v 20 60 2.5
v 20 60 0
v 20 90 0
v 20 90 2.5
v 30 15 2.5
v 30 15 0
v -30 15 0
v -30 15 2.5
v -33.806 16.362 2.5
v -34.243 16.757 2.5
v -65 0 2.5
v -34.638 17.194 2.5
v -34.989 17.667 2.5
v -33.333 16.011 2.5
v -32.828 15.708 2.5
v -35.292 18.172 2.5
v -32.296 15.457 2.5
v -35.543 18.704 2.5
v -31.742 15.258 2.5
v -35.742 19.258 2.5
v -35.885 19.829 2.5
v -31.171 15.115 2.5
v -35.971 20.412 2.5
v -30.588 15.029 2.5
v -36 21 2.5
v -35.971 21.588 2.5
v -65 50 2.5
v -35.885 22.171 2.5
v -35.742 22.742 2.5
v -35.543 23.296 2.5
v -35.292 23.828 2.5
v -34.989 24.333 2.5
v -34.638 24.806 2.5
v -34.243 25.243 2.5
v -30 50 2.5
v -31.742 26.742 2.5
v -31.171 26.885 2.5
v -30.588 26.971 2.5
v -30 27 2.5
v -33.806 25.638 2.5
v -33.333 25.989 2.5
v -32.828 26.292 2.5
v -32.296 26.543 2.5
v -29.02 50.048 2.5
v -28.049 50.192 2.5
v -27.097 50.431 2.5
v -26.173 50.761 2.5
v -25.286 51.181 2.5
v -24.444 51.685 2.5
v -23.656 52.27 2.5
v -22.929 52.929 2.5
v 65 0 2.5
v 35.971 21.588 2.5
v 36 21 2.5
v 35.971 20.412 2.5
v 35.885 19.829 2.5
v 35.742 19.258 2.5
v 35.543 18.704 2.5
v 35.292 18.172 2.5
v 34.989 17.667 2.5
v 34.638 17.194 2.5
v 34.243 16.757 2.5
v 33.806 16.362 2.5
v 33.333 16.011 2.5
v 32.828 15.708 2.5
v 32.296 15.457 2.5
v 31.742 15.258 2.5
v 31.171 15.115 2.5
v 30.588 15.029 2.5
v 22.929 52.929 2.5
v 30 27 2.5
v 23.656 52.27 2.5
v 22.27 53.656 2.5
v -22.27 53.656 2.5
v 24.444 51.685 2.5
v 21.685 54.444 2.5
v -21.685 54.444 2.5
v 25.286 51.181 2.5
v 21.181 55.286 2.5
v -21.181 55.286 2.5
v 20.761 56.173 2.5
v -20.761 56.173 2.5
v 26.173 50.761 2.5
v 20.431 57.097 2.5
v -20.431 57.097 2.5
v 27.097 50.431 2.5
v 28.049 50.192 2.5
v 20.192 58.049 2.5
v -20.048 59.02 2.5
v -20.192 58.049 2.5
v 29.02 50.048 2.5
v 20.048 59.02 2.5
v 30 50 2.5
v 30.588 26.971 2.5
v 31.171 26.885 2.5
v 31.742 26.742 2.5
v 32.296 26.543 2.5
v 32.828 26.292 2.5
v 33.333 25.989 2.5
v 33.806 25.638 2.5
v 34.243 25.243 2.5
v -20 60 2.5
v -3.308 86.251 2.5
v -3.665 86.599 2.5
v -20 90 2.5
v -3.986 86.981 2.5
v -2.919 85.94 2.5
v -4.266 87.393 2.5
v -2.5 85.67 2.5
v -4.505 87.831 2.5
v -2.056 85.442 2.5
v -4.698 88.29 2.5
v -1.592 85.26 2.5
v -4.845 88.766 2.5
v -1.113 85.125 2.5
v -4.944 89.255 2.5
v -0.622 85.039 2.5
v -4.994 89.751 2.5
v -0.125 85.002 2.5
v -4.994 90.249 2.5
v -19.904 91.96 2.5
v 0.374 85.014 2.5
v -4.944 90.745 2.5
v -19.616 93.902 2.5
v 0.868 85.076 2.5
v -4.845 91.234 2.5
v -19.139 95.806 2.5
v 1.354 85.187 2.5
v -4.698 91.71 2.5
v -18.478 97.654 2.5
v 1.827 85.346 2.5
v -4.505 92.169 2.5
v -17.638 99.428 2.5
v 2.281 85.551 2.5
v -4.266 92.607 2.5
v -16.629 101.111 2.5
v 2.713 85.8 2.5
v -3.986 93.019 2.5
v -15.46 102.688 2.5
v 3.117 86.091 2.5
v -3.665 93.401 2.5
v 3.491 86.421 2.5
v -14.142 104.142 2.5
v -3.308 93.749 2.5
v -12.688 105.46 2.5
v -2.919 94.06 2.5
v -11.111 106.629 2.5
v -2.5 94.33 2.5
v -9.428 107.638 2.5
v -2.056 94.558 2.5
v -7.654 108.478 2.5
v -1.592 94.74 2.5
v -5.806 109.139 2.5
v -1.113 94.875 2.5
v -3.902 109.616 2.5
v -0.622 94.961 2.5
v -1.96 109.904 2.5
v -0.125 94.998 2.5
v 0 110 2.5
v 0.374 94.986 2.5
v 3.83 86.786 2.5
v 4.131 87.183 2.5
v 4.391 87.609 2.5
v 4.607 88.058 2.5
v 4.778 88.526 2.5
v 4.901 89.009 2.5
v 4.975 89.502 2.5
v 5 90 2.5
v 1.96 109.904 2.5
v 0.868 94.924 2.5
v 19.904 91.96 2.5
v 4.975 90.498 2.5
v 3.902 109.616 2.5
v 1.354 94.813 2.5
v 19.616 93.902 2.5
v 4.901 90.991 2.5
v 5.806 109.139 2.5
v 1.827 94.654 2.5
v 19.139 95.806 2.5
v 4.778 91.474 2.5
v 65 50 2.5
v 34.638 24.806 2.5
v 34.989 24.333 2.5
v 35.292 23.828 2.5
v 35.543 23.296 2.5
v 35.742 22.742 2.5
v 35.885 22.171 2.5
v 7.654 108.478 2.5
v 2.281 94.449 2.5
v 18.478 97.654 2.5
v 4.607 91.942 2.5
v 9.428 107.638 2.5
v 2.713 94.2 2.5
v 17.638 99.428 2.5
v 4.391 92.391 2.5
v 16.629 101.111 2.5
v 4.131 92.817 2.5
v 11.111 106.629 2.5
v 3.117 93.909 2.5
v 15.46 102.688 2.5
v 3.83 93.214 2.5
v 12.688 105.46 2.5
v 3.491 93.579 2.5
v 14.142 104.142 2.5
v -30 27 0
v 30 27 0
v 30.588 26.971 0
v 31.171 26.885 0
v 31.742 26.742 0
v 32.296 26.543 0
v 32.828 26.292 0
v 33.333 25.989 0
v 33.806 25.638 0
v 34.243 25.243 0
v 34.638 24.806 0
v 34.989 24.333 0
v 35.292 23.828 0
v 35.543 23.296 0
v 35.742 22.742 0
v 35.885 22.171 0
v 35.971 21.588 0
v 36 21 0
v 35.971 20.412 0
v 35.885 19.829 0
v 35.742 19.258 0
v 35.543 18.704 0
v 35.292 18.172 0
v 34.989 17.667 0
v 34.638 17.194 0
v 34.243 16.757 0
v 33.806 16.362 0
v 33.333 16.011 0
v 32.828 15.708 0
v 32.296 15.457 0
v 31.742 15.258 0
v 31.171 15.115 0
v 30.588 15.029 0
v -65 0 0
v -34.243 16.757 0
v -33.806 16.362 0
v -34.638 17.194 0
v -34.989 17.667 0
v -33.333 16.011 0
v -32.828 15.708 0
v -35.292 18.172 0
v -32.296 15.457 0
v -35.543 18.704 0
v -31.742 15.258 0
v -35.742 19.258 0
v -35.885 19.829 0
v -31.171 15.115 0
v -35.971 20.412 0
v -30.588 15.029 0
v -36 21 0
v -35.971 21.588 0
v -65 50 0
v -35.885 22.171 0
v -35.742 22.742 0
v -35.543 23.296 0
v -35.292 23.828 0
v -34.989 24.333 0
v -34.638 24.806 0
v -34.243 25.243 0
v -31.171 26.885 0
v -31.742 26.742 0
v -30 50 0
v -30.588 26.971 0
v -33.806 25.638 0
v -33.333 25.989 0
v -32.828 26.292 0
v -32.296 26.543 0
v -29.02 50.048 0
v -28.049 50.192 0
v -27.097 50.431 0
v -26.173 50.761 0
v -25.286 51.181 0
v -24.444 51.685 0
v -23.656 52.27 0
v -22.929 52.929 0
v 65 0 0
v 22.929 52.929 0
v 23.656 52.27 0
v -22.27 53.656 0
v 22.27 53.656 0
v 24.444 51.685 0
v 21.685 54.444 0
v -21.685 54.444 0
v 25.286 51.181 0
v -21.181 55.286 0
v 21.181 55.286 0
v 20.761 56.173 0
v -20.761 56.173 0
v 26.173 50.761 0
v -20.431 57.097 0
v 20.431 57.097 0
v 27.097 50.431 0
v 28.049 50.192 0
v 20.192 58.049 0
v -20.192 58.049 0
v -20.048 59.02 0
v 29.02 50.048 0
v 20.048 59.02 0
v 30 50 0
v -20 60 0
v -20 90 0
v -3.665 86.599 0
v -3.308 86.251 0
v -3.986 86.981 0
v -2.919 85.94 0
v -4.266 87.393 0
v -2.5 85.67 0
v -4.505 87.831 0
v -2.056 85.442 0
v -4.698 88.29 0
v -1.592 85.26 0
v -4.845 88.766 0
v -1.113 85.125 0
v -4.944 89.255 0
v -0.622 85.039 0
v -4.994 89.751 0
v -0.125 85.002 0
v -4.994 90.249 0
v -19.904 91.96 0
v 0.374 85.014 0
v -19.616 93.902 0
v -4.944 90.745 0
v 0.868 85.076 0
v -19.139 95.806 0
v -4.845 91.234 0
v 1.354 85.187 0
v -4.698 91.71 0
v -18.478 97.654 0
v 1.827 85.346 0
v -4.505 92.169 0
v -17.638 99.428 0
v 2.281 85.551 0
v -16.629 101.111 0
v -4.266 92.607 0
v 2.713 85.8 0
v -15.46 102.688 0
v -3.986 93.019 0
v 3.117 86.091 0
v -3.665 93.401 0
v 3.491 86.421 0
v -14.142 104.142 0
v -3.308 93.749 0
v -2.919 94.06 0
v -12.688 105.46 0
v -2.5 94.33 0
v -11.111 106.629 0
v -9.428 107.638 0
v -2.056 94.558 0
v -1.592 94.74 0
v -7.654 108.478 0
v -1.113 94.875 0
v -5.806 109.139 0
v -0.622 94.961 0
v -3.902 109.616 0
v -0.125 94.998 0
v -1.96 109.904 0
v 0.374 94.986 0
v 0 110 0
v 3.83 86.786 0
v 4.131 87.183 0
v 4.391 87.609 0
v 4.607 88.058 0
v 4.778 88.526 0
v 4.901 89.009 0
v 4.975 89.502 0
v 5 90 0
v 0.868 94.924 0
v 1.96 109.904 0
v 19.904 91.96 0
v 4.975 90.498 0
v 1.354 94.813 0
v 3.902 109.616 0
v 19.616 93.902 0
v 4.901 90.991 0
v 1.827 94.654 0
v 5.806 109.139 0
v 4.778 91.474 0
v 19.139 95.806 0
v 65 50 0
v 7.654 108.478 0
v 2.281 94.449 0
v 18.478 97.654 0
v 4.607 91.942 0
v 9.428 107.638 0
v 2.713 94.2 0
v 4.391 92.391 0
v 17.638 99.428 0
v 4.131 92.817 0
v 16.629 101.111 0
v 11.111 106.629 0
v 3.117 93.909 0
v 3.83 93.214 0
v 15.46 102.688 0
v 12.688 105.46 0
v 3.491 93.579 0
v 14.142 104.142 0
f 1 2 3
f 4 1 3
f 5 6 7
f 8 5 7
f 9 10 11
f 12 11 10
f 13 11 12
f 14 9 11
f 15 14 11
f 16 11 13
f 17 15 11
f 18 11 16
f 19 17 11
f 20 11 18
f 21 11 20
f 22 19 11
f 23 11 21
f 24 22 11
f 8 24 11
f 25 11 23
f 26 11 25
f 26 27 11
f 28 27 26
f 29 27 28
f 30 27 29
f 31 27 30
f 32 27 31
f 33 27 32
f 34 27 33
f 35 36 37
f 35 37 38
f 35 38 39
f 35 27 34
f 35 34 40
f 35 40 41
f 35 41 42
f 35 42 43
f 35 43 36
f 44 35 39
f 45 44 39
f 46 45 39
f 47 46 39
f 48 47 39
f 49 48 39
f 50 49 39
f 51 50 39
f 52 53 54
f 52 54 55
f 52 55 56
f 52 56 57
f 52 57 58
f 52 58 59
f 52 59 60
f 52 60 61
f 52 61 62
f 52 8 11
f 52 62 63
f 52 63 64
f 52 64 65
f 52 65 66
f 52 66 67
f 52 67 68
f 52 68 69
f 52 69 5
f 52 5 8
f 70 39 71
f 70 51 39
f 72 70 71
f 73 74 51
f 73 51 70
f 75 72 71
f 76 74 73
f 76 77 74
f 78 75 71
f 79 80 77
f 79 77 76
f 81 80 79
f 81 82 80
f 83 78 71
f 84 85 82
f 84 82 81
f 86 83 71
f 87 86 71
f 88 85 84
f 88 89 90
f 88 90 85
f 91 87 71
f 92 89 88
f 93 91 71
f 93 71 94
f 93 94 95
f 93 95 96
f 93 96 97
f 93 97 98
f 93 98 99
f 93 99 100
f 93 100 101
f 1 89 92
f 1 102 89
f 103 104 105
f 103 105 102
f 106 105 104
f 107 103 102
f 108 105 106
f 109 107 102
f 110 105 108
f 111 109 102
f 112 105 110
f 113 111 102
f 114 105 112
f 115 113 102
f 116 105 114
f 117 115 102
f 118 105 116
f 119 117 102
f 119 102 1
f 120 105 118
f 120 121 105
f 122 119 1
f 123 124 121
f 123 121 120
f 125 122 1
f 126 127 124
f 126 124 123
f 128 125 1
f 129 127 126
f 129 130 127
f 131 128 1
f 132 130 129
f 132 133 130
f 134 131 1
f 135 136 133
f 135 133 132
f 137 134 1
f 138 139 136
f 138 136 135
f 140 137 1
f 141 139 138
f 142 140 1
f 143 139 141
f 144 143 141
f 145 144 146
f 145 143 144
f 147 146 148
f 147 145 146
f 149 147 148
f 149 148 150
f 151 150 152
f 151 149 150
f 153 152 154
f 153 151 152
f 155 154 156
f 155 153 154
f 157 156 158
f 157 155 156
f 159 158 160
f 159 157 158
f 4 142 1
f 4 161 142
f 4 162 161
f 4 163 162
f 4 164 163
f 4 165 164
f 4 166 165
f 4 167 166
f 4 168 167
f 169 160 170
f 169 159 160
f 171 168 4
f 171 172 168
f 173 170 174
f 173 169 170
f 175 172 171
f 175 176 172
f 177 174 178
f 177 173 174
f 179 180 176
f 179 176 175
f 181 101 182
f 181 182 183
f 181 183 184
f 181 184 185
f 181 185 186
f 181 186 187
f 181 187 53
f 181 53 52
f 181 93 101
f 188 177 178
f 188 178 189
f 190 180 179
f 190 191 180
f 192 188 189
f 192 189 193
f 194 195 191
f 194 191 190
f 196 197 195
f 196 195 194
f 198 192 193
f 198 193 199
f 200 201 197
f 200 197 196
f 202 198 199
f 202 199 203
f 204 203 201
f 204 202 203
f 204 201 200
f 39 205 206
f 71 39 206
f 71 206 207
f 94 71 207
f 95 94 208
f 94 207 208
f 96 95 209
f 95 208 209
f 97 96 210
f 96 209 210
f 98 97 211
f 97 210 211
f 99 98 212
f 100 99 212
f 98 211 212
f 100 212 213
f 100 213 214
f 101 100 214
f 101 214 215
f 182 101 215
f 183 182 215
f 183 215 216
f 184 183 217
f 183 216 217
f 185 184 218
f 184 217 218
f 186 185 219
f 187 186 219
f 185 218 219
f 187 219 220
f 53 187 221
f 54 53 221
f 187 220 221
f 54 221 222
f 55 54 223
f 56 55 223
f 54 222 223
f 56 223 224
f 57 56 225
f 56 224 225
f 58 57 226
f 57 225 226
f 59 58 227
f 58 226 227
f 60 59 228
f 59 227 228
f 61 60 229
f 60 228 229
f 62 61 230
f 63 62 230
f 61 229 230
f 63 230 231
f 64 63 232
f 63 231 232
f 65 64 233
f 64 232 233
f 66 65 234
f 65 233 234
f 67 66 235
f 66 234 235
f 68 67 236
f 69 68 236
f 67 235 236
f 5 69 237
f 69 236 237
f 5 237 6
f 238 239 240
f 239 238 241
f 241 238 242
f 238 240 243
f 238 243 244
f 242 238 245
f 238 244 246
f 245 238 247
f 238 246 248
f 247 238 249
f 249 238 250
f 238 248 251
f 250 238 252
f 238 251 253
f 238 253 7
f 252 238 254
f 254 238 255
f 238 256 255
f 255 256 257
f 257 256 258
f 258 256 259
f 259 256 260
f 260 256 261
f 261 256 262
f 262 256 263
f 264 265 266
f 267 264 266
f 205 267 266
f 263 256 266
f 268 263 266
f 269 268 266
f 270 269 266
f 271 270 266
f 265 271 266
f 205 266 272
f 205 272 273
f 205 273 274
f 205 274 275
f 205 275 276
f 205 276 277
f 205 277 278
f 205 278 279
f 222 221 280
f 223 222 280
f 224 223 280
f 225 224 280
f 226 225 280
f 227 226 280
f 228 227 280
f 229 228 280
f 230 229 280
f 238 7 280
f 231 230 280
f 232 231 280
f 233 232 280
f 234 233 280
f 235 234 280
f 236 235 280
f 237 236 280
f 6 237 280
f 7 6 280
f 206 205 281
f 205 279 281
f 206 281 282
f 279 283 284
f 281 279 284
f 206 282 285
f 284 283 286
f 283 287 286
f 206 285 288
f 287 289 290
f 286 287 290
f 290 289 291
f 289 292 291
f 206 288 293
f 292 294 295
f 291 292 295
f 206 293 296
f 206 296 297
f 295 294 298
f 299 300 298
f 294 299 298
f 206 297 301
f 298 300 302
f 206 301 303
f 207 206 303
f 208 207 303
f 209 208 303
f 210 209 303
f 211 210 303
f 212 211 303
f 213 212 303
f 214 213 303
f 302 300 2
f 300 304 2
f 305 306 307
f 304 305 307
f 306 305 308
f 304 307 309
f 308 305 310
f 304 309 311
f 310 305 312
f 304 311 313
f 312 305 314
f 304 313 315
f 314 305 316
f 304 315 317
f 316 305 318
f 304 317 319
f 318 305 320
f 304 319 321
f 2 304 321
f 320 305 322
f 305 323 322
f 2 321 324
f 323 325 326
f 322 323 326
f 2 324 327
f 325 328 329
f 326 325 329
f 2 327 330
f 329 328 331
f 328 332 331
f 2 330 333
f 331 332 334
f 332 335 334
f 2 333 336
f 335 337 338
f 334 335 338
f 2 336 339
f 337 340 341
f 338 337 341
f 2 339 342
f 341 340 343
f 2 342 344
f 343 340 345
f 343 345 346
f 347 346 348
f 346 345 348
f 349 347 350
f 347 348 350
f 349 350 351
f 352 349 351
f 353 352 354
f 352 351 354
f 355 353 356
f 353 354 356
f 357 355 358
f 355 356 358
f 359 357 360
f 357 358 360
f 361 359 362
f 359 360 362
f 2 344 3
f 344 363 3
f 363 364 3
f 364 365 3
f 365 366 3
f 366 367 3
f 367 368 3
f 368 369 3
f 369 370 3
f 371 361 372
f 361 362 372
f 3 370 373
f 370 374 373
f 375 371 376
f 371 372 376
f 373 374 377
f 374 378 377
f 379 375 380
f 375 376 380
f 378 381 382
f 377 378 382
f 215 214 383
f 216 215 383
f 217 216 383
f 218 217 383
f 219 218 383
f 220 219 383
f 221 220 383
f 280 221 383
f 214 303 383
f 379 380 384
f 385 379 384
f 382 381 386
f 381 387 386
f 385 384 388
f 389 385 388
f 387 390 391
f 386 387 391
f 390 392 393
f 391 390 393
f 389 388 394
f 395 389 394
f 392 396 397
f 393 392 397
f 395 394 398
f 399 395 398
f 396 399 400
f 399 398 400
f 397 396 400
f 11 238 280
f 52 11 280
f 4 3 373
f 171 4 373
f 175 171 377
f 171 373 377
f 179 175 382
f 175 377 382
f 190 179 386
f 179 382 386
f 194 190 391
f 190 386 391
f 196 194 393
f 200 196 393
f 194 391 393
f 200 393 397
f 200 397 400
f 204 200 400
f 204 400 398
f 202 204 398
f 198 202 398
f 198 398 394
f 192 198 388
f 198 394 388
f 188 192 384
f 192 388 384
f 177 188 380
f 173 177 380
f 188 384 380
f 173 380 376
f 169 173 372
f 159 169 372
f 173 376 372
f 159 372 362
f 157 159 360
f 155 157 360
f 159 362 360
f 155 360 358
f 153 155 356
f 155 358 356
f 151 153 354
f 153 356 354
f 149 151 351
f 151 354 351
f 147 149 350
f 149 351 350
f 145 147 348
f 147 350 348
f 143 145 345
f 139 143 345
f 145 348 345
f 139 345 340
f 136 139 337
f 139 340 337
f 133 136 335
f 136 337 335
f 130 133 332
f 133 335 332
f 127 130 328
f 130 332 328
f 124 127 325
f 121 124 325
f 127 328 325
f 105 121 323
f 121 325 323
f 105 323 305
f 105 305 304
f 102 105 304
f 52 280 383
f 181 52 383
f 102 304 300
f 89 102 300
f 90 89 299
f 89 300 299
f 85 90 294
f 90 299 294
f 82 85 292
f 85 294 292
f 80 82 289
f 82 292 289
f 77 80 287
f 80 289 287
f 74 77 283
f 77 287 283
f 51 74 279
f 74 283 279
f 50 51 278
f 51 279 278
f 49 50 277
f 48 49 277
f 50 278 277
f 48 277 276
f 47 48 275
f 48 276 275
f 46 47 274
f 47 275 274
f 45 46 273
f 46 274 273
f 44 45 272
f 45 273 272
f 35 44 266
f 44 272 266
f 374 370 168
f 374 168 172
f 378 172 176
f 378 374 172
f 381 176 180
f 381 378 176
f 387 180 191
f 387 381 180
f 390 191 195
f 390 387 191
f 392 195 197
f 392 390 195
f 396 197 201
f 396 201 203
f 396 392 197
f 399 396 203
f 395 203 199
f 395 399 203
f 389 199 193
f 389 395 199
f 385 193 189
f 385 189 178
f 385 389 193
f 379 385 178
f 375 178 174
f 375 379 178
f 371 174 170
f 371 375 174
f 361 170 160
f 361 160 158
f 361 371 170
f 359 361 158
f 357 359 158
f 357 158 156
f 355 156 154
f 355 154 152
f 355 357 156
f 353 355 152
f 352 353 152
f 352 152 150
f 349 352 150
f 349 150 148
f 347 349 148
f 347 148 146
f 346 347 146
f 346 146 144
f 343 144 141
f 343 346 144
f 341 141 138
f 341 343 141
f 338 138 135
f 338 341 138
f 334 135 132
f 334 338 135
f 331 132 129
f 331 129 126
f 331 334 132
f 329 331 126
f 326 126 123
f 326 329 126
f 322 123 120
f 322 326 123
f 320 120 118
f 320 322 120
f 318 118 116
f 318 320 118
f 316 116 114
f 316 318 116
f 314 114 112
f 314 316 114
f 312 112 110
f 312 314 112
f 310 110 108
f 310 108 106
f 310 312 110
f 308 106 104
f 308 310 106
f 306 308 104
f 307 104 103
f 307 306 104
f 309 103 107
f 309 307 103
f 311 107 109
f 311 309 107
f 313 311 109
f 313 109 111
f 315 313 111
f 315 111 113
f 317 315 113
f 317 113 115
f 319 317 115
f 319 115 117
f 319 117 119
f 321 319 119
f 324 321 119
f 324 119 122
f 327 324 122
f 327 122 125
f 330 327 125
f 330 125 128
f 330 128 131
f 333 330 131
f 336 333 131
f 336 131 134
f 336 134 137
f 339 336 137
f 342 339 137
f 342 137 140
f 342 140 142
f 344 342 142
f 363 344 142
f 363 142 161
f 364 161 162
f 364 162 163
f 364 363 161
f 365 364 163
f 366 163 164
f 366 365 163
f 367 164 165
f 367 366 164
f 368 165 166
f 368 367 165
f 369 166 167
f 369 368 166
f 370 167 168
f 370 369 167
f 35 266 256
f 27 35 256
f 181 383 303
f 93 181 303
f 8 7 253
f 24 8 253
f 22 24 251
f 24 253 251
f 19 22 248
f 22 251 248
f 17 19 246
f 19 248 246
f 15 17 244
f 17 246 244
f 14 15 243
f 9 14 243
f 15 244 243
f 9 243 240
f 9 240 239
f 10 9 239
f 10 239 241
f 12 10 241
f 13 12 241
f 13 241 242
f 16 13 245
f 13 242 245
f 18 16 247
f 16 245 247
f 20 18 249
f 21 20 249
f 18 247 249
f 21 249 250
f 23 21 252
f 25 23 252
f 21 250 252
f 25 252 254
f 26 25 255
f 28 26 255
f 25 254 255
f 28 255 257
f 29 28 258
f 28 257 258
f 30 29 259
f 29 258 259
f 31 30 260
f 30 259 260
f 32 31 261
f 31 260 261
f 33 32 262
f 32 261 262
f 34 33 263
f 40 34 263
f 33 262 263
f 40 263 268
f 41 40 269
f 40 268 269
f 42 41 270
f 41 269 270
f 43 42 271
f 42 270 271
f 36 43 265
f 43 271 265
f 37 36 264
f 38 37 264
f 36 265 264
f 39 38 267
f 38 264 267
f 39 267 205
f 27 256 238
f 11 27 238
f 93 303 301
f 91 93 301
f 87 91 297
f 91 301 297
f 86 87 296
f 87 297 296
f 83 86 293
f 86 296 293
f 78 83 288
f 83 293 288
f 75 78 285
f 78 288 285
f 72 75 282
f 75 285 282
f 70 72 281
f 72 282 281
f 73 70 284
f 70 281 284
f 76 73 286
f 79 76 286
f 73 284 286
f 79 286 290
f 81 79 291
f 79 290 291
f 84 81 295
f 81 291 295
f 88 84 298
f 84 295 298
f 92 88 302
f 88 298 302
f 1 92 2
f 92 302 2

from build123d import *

# Parameters (mm, degrees)
SKIZZE1_R                       = 5
AUFSATZ_LINEAR_AUSTRAGEN1_DEPTH = 2.5


with BuildPart() as part:
    # Skizze1 → Aufsatz-Linear austragen1 (new body)
    with BuildSketch(Plane.XY):
        with BuildLine():
            Line((-65, 0), (65, 0))
            Line((65, 0), (65, 50))
            Line((65, 50), (30, 50))
            ThreePointArc((30, 50), (22.928932188, 52.928932188), (20, 60))
            Line((20, 60), (20, 90))
            ThreePointArc((20, 90), (0, 110), (-20, 90))
            Line((-20, 90), (-20, 60))
            ThreePointArc((-20, 60), (-22.928932188, 52.928932188), (-30, 50))
            Line((-30, 50), (-65, 50))
            Line((-65, 50), (-65, 0))
        make_face()
        with Locations((0, 90)):
            Circle(SKIZZE1_R, mode=Mode.SUBTRACT)
        with BuildLine():
            Line((-30, 27), (30, 27))
            ThreePointArc((30, 27), (36, 21), (30, 15))
            Line((30, 15), (-30, 15))
            ThreePointArc((-30, 15), (-36, 21), (-30, 27))
        make_face(mode=Mode.SUBTRACT)
    extrude(amount=AUFSATZ_LINEAR_AUSTRAGEN1_DEPTH)


solid = part.part
